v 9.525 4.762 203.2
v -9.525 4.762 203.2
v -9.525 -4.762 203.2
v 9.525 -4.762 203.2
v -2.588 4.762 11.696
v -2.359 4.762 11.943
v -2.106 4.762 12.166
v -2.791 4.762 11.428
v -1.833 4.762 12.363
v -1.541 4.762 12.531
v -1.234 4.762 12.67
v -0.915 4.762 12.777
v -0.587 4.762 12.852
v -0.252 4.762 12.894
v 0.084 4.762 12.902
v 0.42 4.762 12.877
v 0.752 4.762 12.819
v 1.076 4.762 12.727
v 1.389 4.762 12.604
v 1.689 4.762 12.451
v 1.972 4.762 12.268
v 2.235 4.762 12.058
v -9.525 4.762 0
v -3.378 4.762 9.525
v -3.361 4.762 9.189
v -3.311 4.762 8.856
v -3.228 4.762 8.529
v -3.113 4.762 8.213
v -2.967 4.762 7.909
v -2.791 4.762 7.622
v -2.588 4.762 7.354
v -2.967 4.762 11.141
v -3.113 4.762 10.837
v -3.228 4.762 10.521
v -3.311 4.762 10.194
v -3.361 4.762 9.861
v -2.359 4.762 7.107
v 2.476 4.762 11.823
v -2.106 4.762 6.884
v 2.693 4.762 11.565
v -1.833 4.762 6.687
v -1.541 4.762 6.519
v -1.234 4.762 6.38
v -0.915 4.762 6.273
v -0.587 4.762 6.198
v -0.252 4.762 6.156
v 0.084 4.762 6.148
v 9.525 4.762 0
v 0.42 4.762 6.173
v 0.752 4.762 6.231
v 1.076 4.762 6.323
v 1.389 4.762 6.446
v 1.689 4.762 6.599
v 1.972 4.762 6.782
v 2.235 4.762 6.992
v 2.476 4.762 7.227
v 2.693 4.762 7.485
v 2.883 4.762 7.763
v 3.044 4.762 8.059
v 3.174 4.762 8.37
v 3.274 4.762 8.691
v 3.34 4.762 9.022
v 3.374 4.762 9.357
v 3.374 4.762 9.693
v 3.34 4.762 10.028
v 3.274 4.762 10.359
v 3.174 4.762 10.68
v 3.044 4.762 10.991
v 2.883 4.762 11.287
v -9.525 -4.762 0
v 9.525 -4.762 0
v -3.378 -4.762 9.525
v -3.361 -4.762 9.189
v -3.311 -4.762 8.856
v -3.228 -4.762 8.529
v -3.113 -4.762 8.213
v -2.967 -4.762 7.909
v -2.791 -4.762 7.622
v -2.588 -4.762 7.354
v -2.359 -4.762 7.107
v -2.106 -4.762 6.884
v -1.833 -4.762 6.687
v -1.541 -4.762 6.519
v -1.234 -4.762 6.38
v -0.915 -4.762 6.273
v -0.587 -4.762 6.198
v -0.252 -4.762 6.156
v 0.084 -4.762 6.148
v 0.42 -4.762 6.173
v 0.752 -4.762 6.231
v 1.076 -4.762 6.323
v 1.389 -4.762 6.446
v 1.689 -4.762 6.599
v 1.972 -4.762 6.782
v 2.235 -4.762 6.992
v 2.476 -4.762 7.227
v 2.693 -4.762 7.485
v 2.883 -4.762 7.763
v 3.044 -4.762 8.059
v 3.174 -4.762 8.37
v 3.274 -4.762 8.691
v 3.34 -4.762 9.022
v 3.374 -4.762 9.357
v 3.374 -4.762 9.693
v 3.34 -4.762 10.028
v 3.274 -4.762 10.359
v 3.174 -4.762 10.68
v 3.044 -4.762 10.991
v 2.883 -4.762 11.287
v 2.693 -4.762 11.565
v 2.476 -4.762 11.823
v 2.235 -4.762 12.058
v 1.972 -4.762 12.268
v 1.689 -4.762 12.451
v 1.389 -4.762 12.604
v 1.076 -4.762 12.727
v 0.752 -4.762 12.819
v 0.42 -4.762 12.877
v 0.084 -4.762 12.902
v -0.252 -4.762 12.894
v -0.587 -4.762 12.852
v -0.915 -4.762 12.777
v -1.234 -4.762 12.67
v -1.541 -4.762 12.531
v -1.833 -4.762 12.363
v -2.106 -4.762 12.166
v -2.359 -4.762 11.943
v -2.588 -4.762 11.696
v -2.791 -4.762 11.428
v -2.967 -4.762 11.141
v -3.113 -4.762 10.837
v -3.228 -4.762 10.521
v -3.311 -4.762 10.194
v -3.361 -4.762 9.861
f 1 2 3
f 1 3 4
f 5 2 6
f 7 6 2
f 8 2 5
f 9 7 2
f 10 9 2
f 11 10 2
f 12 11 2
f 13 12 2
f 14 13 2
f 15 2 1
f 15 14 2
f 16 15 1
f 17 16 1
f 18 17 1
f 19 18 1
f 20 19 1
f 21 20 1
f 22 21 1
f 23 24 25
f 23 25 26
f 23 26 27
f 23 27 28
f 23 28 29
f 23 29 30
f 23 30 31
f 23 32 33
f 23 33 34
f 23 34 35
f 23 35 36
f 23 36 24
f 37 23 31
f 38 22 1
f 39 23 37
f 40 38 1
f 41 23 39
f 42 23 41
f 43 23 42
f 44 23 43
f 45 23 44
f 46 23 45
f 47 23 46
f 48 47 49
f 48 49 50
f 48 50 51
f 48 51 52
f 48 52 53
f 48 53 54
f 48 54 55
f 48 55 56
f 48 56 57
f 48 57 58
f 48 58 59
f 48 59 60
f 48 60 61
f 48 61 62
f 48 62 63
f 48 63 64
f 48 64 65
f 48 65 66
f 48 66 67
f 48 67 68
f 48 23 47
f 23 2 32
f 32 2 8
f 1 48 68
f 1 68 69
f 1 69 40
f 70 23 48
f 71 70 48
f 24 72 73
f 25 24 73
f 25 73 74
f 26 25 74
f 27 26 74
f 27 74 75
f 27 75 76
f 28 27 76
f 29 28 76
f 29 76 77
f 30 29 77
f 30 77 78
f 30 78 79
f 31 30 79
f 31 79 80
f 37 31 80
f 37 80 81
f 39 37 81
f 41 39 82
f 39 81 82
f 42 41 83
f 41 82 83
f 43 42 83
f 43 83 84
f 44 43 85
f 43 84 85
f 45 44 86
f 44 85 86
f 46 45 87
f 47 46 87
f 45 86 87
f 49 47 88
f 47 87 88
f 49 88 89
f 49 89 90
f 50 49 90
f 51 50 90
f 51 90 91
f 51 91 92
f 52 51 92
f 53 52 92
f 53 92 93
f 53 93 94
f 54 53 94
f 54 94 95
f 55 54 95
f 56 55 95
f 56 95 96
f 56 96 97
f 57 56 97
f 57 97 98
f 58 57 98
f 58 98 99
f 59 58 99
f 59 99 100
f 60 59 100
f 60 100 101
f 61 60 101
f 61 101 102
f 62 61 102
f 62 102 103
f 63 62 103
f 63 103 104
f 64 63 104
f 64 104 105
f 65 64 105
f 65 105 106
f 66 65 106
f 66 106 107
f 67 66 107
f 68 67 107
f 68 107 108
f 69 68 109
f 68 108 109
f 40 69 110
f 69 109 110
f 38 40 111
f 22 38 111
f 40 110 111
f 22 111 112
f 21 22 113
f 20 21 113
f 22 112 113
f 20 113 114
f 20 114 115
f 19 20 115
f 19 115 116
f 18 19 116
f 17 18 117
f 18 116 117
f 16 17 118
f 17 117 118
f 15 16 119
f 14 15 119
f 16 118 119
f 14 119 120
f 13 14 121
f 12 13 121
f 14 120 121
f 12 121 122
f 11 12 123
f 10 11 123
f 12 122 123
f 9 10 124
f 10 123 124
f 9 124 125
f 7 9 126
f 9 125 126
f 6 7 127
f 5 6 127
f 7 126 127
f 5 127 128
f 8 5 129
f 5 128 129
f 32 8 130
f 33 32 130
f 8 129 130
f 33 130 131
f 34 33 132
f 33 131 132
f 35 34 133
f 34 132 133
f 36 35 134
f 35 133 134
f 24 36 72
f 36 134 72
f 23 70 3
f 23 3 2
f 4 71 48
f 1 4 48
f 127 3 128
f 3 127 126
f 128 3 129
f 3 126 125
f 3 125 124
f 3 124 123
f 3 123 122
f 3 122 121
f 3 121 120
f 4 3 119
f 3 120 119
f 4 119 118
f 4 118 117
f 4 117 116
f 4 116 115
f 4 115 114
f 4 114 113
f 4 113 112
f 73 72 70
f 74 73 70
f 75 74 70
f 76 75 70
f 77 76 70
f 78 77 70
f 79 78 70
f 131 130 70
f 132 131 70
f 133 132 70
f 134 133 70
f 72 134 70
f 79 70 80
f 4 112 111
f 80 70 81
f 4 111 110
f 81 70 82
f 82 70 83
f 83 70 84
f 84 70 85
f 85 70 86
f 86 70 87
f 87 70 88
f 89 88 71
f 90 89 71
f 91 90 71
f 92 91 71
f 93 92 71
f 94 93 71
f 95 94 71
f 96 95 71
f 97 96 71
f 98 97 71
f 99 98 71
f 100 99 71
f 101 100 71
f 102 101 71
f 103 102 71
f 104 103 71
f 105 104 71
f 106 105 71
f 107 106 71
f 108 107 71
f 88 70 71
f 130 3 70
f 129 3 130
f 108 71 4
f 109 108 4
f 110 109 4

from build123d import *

# Parameters (mm, degrees)
SKETCH1_W               = 19.05
SKETCH1_H               = 9.525
BOSS_EXTRUDE1_DEPTH     = 203.2
F_1_4_CLEARANCE_HOLE1_D = 6.7564


with BuildPart() as part:
    # Sketch1 → Boss-Extrude1 (new body)
    with BuildSketch(Plane.XY):
        Rectangle(SKETCH1_W, SKETCH1_H)
    extrude(amount=BOSS_EXTRUDE1_DEPTH)

    # 1/4 Clearance Hole1 (through all)
    with Locations(Plane(origin=(0, 4.7625, 0), x_dir=(1, 0, 0), z_dir=(0, 1, 0))):
        with Locations((0, -9.525)):
            Hole(F_1_4_CLEARANCE_HOLE1_D / 2)


solid = part.part
